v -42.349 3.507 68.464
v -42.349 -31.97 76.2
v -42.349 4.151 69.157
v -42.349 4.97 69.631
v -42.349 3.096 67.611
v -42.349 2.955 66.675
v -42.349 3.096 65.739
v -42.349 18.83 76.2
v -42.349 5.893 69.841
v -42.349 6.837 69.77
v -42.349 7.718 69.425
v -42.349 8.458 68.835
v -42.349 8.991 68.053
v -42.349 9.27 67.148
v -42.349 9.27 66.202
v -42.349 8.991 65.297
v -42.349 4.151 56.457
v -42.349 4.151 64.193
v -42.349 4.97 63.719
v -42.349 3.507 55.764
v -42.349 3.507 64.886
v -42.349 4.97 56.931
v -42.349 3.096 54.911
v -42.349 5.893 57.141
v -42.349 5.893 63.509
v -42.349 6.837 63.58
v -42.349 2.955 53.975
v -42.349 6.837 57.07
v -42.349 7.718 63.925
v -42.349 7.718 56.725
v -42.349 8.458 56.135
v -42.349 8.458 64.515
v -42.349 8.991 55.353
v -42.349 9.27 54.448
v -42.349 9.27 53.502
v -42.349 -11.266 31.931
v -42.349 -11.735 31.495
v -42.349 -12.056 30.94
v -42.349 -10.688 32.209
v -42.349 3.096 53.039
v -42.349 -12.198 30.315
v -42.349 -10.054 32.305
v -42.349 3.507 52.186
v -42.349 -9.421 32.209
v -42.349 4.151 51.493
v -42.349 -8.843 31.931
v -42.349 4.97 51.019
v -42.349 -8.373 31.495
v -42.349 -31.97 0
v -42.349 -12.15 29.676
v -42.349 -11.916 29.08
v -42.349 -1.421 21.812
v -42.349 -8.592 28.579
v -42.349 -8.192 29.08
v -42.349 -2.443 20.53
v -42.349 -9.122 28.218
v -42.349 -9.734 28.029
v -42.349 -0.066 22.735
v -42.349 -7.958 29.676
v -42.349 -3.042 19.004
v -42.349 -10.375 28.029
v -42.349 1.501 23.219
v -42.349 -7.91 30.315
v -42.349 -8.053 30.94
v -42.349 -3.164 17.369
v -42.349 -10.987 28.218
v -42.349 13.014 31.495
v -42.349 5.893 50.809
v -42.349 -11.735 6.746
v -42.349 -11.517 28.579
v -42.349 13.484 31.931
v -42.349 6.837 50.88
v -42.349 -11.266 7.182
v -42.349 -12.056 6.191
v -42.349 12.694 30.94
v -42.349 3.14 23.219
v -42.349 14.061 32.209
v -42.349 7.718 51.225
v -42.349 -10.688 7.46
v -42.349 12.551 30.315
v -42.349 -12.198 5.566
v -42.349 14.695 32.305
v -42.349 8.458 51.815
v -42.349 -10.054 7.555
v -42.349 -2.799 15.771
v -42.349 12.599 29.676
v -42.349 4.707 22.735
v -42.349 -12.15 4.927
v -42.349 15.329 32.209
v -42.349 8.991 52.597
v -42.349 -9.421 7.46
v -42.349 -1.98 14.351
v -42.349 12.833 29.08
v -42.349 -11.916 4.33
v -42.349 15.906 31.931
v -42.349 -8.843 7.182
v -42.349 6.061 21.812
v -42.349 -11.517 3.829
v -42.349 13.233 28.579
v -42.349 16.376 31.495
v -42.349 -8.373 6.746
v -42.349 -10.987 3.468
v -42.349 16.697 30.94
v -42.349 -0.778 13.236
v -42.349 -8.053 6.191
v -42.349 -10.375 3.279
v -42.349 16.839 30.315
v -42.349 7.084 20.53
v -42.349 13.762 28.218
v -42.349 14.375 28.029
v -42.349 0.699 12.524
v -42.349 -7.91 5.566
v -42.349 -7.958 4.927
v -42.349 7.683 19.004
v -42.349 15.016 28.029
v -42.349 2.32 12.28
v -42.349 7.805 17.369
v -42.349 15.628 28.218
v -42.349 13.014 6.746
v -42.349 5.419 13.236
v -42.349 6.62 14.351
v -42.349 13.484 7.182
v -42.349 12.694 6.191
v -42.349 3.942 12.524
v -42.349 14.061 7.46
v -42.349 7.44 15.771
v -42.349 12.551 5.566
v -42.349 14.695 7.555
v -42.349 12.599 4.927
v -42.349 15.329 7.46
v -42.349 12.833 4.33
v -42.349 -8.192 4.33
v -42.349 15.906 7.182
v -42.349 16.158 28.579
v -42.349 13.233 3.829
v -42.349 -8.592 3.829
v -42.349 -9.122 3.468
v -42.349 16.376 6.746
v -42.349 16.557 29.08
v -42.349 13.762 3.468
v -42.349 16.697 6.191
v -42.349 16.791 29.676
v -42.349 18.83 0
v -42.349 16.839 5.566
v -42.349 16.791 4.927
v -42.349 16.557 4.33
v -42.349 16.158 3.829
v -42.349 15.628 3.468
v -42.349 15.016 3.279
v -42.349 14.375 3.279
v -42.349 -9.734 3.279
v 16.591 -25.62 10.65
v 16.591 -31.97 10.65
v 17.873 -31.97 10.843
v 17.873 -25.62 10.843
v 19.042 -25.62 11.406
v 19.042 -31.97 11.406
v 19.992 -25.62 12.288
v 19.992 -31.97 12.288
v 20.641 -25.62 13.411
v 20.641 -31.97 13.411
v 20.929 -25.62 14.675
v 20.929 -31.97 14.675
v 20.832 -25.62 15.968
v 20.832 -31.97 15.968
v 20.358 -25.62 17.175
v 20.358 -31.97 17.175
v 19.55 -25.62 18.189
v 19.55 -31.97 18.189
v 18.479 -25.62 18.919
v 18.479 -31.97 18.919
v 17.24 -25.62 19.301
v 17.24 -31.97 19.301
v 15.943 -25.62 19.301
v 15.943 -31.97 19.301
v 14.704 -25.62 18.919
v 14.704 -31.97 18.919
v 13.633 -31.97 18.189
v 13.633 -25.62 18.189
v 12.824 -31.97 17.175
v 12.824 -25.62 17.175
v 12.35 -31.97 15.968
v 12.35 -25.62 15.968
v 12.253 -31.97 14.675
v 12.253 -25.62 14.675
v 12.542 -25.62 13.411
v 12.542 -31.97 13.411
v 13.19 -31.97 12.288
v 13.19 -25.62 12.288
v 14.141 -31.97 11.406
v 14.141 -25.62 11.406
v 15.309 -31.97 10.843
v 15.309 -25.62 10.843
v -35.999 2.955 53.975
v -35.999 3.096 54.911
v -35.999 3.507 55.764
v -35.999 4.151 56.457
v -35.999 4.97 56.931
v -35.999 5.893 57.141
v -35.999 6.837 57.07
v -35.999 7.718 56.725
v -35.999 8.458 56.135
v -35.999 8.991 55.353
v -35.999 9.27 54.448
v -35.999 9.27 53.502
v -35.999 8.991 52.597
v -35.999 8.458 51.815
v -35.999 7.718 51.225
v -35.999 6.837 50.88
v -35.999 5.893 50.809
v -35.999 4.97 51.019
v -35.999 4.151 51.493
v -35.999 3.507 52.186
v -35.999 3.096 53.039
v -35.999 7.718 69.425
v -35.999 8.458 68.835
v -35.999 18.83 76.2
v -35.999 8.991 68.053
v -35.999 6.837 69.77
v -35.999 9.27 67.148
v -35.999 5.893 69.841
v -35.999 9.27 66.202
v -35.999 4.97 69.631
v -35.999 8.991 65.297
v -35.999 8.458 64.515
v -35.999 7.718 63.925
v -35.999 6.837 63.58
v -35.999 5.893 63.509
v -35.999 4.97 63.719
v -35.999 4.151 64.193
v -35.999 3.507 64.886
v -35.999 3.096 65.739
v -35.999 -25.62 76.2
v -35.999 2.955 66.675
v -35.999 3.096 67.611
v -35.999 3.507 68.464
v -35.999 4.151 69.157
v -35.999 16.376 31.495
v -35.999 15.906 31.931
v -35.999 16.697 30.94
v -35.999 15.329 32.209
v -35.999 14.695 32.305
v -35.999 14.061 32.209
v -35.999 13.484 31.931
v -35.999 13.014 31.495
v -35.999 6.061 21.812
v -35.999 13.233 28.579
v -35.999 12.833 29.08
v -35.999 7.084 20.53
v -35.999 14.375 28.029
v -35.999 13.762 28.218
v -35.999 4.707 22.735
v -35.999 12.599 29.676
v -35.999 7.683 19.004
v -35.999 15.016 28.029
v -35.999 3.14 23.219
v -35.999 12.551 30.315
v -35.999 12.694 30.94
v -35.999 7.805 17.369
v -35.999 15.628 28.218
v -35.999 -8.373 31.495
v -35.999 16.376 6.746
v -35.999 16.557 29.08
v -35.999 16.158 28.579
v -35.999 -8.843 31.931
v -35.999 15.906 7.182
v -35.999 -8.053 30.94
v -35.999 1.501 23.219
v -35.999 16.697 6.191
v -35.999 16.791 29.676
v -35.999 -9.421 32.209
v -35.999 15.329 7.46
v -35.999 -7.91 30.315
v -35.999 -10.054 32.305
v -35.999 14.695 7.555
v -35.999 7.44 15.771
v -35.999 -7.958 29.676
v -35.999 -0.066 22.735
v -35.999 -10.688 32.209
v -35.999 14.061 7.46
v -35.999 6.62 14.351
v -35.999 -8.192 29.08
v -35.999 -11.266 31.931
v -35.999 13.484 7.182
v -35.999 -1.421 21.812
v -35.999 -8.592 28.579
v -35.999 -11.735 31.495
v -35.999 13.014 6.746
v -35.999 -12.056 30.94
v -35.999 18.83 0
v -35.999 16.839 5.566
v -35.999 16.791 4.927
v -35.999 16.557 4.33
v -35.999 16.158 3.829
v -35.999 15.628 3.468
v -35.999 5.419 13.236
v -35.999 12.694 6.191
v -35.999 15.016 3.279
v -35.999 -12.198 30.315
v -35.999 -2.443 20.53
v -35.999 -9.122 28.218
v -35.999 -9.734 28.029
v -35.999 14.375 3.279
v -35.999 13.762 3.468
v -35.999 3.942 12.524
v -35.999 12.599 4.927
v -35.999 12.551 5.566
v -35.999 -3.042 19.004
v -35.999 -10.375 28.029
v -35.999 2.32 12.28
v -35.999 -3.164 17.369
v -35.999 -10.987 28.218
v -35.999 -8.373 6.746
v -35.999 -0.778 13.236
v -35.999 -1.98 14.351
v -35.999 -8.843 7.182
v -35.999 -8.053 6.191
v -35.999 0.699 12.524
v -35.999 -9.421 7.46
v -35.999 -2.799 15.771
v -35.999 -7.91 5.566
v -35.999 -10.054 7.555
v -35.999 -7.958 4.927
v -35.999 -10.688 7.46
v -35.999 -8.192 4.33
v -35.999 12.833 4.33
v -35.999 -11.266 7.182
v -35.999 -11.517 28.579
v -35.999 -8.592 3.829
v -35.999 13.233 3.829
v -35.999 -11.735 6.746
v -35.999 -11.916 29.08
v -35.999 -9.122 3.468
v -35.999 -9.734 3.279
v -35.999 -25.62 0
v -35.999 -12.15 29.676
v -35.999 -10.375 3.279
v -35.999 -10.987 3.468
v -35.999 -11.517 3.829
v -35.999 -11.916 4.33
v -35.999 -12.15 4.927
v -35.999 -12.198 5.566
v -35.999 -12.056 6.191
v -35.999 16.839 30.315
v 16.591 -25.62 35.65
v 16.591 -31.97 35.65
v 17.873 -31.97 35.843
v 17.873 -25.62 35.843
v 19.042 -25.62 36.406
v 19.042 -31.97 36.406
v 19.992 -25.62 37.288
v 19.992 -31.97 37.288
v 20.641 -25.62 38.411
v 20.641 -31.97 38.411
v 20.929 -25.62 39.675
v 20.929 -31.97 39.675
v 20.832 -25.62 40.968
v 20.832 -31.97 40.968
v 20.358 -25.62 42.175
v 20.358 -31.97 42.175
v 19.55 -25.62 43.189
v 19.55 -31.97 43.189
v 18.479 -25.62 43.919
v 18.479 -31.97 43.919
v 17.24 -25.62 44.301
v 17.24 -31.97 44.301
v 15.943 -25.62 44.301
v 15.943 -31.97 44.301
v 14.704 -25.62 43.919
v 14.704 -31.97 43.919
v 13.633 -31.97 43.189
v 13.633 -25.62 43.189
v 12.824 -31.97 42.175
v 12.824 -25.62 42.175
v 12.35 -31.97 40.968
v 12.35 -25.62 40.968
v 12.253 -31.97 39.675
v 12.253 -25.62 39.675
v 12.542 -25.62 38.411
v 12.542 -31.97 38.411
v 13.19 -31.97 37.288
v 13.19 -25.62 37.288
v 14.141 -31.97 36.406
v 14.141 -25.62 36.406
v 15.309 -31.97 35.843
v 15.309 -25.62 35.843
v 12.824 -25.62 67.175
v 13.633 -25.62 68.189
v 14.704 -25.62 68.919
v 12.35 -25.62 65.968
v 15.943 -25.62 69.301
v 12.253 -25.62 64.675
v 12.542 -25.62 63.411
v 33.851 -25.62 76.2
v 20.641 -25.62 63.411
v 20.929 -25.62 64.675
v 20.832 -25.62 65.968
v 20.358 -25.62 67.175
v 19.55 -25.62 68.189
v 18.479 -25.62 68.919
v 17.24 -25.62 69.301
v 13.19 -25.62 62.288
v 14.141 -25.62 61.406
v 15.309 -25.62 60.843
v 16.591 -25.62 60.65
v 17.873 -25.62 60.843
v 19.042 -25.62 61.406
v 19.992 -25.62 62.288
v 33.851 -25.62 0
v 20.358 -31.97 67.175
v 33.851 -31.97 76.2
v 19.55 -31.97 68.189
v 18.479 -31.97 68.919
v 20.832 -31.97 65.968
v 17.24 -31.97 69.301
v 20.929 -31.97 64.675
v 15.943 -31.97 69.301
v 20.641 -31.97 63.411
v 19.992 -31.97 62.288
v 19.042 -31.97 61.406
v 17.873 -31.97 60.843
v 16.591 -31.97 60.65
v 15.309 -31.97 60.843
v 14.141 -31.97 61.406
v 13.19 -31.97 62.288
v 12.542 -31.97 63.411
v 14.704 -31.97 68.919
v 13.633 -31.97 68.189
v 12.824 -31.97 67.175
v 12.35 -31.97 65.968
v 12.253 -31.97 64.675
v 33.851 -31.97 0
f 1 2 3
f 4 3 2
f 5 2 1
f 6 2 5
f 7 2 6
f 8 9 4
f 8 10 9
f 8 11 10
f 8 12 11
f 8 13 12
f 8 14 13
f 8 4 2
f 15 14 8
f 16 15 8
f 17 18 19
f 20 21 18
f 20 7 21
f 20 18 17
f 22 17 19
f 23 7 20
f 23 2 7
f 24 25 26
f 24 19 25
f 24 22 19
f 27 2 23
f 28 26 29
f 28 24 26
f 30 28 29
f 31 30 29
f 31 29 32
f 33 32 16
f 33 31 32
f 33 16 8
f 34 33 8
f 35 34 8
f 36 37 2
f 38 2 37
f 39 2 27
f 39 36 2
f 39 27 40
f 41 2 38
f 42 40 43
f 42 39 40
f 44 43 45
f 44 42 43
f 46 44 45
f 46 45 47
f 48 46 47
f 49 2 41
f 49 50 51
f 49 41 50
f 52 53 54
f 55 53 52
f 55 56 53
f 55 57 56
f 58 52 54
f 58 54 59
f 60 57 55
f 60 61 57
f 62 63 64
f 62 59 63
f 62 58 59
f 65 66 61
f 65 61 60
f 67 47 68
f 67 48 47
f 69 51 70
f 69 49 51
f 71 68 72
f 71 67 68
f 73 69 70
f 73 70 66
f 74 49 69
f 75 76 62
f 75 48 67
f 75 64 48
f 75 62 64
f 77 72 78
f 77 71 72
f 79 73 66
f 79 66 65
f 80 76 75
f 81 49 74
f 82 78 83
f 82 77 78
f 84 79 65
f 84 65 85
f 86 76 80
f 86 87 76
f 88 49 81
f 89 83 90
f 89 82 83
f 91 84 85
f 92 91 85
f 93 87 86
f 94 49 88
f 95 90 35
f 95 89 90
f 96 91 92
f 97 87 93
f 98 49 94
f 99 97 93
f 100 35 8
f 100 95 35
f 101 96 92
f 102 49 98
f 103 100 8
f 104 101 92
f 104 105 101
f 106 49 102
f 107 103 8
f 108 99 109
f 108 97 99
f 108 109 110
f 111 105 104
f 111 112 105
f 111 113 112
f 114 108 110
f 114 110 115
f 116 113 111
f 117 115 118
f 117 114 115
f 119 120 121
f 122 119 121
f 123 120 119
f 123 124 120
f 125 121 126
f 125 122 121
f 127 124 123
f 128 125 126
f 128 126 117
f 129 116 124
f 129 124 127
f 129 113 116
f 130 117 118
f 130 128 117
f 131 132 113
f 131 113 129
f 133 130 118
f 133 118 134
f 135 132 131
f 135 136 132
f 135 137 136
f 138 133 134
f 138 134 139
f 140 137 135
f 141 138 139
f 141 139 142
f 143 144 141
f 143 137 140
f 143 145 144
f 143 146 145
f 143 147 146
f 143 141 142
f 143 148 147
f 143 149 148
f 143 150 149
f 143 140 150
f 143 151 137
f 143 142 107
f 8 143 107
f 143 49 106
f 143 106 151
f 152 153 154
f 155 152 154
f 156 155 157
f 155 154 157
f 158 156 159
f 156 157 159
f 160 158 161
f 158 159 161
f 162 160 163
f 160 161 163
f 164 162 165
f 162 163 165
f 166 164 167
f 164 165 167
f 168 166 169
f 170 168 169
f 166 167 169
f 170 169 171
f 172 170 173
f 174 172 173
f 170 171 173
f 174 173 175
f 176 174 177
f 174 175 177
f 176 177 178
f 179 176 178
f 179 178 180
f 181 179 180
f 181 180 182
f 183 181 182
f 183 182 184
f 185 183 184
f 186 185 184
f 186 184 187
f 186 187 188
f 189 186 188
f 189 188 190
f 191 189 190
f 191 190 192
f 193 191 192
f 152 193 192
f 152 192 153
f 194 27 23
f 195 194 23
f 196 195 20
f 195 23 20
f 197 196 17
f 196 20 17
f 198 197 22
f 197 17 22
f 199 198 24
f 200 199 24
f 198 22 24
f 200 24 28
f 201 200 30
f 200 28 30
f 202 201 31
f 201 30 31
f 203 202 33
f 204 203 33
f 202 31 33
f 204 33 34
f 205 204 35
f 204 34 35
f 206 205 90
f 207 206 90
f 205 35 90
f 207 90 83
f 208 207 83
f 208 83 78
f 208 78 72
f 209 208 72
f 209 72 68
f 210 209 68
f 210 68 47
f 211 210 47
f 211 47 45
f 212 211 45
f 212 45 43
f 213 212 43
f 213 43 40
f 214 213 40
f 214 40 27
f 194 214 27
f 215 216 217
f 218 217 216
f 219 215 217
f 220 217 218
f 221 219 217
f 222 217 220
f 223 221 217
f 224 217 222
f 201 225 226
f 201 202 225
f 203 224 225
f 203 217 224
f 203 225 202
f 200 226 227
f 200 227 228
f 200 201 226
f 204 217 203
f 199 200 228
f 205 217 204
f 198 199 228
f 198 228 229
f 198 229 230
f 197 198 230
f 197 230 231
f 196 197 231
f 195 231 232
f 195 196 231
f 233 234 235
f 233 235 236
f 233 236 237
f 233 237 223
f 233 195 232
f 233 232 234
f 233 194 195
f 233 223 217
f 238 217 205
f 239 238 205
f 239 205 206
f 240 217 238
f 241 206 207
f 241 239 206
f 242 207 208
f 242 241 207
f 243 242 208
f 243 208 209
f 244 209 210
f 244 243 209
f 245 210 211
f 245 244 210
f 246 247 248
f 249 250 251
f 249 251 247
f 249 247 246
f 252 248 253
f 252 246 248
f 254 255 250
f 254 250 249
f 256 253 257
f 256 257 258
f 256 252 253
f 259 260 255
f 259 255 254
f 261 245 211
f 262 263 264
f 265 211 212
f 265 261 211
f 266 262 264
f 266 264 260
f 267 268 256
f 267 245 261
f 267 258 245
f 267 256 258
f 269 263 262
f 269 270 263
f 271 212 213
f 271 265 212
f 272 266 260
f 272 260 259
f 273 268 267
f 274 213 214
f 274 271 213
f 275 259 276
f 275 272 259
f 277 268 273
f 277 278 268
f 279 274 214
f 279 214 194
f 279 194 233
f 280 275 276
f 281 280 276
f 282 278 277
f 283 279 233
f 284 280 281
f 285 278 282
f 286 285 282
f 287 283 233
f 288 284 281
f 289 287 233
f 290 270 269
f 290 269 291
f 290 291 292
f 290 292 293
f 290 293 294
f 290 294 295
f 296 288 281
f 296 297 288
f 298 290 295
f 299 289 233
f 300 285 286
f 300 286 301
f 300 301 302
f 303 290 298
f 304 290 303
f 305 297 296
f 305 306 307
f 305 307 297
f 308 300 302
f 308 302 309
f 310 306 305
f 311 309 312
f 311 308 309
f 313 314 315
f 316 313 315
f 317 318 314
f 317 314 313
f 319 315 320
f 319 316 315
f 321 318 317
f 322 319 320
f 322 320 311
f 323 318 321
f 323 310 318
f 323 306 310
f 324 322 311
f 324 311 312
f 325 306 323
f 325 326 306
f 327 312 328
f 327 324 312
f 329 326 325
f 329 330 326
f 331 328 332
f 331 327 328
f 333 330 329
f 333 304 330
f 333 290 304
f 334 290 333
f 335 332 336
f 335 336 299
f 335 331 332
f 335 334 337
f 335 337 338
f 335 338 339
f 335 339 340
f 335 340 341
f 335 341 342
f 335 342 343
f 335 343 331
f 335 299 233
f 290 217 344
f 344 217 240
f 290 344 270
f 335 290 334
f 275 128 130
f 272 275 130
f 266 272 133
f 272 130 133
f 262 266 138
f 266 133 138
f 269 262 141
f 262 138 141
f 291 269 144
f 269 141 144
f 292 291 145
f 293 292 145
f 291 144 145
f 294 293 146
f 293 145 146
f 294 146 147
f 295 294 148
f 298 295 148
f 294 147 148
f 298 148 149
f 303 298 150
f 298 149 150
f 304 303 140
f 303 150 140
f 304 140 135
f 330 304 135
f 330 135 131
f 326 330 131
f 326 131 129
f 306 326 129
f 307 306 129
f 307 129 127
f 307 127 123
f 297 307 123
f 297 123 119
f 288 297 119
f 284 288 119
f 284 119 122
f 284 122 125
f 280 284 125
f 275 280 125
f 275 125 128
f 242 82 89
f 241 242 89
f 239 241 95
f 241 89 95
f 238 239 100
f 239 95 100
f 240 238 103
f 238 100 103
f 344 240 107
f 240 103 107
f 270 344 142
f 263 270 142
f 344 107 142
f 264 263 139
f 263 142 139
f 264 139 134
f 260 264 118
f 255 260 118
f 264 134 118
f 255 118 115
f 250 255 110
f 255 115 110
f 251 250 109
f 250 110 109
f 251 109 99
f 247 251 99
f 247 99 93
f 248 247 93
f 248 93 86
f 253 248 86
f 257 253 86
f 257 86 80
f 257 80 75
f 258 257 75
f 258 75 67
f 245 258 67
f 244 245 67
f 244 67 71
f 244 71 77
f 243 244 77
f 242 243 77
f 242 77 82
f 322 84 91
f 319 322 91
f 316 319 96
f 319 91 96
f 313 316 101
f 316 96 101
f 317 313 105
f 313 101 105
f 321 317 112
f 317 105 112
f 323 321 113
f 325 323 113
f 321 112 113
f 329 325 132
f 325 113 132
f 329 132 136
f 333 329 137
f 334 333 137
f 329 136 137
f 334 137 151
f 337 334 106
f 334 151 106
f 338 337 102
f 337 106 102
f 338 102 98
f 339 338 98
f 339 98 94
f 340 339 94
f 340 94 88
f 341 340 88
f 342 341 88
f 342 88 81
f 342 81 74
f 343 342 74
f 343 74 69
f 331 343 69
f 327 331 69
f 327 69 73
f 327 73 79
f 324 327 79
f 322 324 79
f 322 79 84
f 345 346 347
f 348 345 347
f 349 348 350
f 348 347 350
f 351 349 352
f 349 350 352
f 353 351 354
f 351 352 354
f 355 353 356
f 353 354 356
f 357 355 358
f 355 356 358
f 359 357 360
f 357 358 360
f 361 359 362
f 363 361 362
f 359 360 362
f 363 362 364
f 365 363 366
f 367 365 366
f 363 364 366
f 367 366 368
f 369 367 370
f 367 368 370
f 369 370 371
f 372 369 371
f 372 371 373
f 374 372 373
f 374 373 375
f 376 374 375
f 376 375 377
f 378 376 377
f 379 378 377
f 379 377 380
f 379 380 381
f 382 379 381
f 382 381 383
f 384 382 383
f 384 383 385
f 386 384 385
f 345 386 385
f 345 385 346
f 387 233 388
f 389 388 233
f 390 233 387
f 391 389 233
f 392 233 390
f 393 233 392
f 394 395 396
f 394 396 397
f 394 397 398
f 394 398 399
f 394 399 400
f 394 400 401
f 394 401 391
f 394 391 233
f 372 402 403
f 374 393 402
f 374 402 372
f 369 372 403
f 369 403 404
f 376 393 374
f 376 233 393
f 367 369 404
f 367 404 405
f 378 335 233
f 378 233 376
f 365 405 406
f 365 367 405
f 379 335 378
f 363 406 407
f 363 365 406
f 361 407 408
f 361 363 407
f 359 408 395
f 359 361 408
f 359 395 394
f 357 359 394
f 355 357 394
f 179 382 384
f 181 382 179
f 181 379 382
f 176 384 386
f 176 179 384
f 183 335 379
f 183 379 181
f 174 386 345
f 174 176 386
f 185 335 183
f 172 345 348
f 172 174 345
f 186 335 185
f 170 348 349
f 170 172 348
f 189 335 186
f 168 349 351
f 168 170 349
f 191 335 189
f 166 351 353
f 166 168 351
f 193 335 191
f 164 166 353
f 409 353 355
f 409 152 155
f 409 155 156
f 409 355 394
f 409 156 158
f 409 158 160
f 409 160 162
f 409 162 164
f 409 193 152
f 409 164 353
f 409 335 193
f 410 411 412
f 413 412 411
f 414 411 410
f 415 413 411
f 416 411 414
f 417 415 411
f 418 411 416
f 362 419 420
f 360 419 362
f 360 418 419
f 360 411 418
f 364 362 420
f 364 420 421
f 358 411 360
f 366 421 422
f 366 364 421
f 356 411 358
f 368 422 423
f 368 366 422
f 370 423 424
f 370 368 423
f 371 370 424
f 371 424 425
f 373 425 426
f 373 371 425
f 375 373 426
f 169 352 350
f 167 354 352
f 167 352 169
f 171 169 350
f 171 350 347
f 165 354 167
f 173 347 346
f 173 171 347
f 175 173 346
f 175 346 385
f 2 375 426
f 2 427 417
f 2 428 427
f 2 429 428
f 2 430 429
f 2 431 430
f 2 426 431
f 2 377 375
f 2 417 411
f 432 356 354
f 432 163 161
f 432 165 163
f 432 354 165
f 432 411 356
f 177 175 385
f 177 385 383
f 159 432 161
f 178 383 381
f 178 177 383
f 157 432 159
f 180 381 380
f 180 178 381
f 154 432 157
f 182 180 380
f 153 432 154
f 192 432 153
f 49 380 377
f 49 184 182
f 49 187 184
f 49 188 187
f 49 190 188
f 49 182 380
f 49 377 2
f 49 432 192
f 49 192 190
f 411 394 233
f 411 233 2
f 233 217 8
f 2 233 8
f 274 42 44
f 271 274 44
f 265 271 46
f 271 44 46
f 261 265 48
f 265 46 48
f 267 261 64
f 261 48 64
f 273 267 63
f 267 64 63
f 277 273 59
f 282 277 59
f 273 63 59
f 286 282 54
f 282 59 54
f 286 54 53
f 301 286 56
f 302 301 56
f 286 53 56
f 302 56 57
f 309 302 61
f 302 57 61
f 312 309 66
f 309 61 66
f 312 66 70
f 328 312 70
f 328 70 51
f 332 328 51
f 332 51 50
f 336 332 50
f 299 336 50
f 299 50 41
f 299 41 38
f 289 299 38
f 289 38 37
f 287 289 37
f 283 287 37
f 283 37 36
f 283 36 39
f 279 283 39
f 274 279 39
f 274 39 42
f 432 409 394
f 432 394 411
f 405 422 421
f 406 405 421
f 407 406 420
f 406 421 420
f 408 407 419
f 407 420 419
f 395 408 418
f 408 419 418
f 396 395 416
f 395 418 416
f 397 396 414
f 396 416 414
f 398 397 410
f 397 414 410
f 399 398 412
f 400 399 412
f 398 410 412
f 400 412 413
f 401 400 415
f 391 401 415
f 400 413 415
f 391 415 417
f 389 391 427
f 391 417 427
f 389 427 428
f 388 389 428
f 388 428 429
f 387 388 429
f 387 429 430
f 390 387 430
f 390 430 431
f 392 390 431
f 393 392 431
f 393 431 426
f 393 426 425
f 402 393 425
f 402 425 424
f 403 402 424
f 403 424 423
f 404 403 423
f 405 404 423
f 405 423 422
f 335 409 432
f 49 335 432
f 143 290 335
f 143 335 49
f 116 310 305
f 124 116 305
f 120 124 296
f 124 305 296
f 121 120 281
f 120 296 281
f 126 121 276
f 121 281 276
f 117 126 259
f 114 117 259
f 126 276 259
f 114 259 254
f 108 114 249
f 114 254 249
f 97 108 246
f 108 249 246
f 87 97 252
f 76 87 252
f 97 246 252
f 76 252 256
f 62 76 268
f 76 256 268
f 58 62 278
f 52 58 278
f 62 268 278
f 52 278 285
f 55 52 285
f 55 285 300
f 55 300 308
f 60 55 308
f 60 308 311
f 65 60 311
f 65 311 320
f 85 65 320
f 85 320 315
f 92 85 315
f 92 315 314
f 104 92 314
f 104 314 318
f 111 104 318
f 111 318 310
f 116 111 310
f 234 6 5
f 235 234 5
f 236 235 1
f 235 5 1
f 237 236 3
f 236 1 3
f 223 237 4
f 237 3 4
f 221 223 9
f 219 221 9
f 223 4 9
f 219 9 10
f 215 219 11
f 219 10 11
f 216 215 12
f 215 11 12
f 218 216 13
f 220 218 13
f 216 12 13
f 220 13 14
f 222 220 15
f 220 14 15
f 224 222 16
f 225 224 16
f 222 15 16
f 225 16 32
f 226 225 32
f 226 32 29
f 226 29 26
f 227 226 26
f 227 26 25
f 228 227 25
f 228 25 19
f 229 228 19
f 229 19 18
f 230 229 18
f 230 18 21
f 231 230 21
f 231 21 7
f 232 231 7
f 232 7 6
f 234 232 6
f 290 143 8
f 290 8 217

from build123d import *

# Parameters (mm, degrees)
BOSS_EXTRUDE1_DEPTH  = 76.2
M4_CLEARANCE_HOLE1_D = 4.3
SKETCH2_R            = 5.5
CUT_EXTRUDE1_DEPTH   = 8.636
SKETCH6_R            = 4.35
CUT_EXTRUDE2_DEPTH   = 13.97
CUT_EXTRUDE3_REACH   = 114.405
SKETCH7_R            = 3.175


with BuildPart() as part:
    # Sketch1 → Boss-Extrude1 (new body)
    with BuildSketch(Plane.XY):
        Polygon((-35.999033751, 18.830418264), (-35.999033751, -25.619581736), (33.850966249, -25.619581736), (33.850966249, -31.969581736), (-42.349033751, -31.969581736), (-42.349033751, 18.830418264), align=None)
    extrude(amount=BOSS_EXTRUDE1_DEPTH)

    # M4 Clearance Hole1 (through all)
    with Locations(Plane(origin=(-35.999033751, 0, 0), x_dir=(0, 0, -1), z_dir=(1, 0, 0))):
        with Locations((-30.154792935, 14.695211199), (-30.154792935, -10.054374671), (-5.405207065, -10.054374671), (-5.405207065, 14.695211199)):
            Hole(M4_CLEARANCE_HOLE1_D / 2)

    # Sketch2 → Cut-Extrude1 (cut)
    with BuildSketch(Plane(origin=(-35.999033751, 0, 0), x_dir=(0, 0, -1), z_dir=(1, 0, 0))):
        with Locations((-17.78, 2.320418264)):
            Circle(SKETCH2_R)
    extrude(amount=-CUT_EXTRUDE1_DEPTH, mode=Mode.SUBTRACT)

    # Sketch6 → Cut-Extrude2 (cut)
    with BuildSketch(Plane.XZ.offset(31.969581736)):
        with Locations(Location((16.591266249, 65, 0), (0, 0, 270))):
            Circle(SKETCH6_R)
        with Locations(Location((16.591266249, 15, 0), (0, 0, 270))):
            Circle(SKETCH6_R)
        with Locations(Location((16.591266249, 40, 0), (0, 0, 270))):
            Circle(SKETCH6_R)
    extrude(amount=-CUT_EXTRUDE2_DEPTH, mode=Mode.SUBTRACT)

    # Sketch7 → Cut-Extrude3 (cut, up to next)
    with BuildSketch(Plane.ZY.offset(42.349033751), mode=Mode.PRIVATE) as cut_extrude3_sk1:
        with Locations(Location((53.975, 6.130418264, 0), (0, 0, 270))):
            Circle(SKETCH7_R)
    cut_extrude3_tool1 = extrude(cut_extrude3_sk1.sketch, amount=-CUT_EXTRUDE3_REACH, mode=Mode.PRIVATE) & part.part
    # Sketch7 → Cut-Extrude3 (cut, up to next)
    with BuildSketch(Plane.ZY.offset(42.349033751), mode=Mode.PRIVATE) as cut_extrude3_sk2:
        with Locations(Location((66.675, 6.130418264, 0), (0, 0, 270))):
            Circle(SKETCH7_R)
    cut_extrude3_tool2 = extrude(cut_extrude3_sk2.sketch, amount=-CUT_EXTRUDE3_REACH, mode=Mode.PRIVATE) & part.part
    add(cut_extrude3_tool1.solids().sort_by_distance((-42.349034, 6.130418, 53.975))[0], mode=Mode.SUBTRACT)
    add(cut_extrude3_tool2.solids().sort_by_distance((-42.349034, 6.130418, 66.675))[0], mode=Mode.SUBTRACT)


solid = part.part
